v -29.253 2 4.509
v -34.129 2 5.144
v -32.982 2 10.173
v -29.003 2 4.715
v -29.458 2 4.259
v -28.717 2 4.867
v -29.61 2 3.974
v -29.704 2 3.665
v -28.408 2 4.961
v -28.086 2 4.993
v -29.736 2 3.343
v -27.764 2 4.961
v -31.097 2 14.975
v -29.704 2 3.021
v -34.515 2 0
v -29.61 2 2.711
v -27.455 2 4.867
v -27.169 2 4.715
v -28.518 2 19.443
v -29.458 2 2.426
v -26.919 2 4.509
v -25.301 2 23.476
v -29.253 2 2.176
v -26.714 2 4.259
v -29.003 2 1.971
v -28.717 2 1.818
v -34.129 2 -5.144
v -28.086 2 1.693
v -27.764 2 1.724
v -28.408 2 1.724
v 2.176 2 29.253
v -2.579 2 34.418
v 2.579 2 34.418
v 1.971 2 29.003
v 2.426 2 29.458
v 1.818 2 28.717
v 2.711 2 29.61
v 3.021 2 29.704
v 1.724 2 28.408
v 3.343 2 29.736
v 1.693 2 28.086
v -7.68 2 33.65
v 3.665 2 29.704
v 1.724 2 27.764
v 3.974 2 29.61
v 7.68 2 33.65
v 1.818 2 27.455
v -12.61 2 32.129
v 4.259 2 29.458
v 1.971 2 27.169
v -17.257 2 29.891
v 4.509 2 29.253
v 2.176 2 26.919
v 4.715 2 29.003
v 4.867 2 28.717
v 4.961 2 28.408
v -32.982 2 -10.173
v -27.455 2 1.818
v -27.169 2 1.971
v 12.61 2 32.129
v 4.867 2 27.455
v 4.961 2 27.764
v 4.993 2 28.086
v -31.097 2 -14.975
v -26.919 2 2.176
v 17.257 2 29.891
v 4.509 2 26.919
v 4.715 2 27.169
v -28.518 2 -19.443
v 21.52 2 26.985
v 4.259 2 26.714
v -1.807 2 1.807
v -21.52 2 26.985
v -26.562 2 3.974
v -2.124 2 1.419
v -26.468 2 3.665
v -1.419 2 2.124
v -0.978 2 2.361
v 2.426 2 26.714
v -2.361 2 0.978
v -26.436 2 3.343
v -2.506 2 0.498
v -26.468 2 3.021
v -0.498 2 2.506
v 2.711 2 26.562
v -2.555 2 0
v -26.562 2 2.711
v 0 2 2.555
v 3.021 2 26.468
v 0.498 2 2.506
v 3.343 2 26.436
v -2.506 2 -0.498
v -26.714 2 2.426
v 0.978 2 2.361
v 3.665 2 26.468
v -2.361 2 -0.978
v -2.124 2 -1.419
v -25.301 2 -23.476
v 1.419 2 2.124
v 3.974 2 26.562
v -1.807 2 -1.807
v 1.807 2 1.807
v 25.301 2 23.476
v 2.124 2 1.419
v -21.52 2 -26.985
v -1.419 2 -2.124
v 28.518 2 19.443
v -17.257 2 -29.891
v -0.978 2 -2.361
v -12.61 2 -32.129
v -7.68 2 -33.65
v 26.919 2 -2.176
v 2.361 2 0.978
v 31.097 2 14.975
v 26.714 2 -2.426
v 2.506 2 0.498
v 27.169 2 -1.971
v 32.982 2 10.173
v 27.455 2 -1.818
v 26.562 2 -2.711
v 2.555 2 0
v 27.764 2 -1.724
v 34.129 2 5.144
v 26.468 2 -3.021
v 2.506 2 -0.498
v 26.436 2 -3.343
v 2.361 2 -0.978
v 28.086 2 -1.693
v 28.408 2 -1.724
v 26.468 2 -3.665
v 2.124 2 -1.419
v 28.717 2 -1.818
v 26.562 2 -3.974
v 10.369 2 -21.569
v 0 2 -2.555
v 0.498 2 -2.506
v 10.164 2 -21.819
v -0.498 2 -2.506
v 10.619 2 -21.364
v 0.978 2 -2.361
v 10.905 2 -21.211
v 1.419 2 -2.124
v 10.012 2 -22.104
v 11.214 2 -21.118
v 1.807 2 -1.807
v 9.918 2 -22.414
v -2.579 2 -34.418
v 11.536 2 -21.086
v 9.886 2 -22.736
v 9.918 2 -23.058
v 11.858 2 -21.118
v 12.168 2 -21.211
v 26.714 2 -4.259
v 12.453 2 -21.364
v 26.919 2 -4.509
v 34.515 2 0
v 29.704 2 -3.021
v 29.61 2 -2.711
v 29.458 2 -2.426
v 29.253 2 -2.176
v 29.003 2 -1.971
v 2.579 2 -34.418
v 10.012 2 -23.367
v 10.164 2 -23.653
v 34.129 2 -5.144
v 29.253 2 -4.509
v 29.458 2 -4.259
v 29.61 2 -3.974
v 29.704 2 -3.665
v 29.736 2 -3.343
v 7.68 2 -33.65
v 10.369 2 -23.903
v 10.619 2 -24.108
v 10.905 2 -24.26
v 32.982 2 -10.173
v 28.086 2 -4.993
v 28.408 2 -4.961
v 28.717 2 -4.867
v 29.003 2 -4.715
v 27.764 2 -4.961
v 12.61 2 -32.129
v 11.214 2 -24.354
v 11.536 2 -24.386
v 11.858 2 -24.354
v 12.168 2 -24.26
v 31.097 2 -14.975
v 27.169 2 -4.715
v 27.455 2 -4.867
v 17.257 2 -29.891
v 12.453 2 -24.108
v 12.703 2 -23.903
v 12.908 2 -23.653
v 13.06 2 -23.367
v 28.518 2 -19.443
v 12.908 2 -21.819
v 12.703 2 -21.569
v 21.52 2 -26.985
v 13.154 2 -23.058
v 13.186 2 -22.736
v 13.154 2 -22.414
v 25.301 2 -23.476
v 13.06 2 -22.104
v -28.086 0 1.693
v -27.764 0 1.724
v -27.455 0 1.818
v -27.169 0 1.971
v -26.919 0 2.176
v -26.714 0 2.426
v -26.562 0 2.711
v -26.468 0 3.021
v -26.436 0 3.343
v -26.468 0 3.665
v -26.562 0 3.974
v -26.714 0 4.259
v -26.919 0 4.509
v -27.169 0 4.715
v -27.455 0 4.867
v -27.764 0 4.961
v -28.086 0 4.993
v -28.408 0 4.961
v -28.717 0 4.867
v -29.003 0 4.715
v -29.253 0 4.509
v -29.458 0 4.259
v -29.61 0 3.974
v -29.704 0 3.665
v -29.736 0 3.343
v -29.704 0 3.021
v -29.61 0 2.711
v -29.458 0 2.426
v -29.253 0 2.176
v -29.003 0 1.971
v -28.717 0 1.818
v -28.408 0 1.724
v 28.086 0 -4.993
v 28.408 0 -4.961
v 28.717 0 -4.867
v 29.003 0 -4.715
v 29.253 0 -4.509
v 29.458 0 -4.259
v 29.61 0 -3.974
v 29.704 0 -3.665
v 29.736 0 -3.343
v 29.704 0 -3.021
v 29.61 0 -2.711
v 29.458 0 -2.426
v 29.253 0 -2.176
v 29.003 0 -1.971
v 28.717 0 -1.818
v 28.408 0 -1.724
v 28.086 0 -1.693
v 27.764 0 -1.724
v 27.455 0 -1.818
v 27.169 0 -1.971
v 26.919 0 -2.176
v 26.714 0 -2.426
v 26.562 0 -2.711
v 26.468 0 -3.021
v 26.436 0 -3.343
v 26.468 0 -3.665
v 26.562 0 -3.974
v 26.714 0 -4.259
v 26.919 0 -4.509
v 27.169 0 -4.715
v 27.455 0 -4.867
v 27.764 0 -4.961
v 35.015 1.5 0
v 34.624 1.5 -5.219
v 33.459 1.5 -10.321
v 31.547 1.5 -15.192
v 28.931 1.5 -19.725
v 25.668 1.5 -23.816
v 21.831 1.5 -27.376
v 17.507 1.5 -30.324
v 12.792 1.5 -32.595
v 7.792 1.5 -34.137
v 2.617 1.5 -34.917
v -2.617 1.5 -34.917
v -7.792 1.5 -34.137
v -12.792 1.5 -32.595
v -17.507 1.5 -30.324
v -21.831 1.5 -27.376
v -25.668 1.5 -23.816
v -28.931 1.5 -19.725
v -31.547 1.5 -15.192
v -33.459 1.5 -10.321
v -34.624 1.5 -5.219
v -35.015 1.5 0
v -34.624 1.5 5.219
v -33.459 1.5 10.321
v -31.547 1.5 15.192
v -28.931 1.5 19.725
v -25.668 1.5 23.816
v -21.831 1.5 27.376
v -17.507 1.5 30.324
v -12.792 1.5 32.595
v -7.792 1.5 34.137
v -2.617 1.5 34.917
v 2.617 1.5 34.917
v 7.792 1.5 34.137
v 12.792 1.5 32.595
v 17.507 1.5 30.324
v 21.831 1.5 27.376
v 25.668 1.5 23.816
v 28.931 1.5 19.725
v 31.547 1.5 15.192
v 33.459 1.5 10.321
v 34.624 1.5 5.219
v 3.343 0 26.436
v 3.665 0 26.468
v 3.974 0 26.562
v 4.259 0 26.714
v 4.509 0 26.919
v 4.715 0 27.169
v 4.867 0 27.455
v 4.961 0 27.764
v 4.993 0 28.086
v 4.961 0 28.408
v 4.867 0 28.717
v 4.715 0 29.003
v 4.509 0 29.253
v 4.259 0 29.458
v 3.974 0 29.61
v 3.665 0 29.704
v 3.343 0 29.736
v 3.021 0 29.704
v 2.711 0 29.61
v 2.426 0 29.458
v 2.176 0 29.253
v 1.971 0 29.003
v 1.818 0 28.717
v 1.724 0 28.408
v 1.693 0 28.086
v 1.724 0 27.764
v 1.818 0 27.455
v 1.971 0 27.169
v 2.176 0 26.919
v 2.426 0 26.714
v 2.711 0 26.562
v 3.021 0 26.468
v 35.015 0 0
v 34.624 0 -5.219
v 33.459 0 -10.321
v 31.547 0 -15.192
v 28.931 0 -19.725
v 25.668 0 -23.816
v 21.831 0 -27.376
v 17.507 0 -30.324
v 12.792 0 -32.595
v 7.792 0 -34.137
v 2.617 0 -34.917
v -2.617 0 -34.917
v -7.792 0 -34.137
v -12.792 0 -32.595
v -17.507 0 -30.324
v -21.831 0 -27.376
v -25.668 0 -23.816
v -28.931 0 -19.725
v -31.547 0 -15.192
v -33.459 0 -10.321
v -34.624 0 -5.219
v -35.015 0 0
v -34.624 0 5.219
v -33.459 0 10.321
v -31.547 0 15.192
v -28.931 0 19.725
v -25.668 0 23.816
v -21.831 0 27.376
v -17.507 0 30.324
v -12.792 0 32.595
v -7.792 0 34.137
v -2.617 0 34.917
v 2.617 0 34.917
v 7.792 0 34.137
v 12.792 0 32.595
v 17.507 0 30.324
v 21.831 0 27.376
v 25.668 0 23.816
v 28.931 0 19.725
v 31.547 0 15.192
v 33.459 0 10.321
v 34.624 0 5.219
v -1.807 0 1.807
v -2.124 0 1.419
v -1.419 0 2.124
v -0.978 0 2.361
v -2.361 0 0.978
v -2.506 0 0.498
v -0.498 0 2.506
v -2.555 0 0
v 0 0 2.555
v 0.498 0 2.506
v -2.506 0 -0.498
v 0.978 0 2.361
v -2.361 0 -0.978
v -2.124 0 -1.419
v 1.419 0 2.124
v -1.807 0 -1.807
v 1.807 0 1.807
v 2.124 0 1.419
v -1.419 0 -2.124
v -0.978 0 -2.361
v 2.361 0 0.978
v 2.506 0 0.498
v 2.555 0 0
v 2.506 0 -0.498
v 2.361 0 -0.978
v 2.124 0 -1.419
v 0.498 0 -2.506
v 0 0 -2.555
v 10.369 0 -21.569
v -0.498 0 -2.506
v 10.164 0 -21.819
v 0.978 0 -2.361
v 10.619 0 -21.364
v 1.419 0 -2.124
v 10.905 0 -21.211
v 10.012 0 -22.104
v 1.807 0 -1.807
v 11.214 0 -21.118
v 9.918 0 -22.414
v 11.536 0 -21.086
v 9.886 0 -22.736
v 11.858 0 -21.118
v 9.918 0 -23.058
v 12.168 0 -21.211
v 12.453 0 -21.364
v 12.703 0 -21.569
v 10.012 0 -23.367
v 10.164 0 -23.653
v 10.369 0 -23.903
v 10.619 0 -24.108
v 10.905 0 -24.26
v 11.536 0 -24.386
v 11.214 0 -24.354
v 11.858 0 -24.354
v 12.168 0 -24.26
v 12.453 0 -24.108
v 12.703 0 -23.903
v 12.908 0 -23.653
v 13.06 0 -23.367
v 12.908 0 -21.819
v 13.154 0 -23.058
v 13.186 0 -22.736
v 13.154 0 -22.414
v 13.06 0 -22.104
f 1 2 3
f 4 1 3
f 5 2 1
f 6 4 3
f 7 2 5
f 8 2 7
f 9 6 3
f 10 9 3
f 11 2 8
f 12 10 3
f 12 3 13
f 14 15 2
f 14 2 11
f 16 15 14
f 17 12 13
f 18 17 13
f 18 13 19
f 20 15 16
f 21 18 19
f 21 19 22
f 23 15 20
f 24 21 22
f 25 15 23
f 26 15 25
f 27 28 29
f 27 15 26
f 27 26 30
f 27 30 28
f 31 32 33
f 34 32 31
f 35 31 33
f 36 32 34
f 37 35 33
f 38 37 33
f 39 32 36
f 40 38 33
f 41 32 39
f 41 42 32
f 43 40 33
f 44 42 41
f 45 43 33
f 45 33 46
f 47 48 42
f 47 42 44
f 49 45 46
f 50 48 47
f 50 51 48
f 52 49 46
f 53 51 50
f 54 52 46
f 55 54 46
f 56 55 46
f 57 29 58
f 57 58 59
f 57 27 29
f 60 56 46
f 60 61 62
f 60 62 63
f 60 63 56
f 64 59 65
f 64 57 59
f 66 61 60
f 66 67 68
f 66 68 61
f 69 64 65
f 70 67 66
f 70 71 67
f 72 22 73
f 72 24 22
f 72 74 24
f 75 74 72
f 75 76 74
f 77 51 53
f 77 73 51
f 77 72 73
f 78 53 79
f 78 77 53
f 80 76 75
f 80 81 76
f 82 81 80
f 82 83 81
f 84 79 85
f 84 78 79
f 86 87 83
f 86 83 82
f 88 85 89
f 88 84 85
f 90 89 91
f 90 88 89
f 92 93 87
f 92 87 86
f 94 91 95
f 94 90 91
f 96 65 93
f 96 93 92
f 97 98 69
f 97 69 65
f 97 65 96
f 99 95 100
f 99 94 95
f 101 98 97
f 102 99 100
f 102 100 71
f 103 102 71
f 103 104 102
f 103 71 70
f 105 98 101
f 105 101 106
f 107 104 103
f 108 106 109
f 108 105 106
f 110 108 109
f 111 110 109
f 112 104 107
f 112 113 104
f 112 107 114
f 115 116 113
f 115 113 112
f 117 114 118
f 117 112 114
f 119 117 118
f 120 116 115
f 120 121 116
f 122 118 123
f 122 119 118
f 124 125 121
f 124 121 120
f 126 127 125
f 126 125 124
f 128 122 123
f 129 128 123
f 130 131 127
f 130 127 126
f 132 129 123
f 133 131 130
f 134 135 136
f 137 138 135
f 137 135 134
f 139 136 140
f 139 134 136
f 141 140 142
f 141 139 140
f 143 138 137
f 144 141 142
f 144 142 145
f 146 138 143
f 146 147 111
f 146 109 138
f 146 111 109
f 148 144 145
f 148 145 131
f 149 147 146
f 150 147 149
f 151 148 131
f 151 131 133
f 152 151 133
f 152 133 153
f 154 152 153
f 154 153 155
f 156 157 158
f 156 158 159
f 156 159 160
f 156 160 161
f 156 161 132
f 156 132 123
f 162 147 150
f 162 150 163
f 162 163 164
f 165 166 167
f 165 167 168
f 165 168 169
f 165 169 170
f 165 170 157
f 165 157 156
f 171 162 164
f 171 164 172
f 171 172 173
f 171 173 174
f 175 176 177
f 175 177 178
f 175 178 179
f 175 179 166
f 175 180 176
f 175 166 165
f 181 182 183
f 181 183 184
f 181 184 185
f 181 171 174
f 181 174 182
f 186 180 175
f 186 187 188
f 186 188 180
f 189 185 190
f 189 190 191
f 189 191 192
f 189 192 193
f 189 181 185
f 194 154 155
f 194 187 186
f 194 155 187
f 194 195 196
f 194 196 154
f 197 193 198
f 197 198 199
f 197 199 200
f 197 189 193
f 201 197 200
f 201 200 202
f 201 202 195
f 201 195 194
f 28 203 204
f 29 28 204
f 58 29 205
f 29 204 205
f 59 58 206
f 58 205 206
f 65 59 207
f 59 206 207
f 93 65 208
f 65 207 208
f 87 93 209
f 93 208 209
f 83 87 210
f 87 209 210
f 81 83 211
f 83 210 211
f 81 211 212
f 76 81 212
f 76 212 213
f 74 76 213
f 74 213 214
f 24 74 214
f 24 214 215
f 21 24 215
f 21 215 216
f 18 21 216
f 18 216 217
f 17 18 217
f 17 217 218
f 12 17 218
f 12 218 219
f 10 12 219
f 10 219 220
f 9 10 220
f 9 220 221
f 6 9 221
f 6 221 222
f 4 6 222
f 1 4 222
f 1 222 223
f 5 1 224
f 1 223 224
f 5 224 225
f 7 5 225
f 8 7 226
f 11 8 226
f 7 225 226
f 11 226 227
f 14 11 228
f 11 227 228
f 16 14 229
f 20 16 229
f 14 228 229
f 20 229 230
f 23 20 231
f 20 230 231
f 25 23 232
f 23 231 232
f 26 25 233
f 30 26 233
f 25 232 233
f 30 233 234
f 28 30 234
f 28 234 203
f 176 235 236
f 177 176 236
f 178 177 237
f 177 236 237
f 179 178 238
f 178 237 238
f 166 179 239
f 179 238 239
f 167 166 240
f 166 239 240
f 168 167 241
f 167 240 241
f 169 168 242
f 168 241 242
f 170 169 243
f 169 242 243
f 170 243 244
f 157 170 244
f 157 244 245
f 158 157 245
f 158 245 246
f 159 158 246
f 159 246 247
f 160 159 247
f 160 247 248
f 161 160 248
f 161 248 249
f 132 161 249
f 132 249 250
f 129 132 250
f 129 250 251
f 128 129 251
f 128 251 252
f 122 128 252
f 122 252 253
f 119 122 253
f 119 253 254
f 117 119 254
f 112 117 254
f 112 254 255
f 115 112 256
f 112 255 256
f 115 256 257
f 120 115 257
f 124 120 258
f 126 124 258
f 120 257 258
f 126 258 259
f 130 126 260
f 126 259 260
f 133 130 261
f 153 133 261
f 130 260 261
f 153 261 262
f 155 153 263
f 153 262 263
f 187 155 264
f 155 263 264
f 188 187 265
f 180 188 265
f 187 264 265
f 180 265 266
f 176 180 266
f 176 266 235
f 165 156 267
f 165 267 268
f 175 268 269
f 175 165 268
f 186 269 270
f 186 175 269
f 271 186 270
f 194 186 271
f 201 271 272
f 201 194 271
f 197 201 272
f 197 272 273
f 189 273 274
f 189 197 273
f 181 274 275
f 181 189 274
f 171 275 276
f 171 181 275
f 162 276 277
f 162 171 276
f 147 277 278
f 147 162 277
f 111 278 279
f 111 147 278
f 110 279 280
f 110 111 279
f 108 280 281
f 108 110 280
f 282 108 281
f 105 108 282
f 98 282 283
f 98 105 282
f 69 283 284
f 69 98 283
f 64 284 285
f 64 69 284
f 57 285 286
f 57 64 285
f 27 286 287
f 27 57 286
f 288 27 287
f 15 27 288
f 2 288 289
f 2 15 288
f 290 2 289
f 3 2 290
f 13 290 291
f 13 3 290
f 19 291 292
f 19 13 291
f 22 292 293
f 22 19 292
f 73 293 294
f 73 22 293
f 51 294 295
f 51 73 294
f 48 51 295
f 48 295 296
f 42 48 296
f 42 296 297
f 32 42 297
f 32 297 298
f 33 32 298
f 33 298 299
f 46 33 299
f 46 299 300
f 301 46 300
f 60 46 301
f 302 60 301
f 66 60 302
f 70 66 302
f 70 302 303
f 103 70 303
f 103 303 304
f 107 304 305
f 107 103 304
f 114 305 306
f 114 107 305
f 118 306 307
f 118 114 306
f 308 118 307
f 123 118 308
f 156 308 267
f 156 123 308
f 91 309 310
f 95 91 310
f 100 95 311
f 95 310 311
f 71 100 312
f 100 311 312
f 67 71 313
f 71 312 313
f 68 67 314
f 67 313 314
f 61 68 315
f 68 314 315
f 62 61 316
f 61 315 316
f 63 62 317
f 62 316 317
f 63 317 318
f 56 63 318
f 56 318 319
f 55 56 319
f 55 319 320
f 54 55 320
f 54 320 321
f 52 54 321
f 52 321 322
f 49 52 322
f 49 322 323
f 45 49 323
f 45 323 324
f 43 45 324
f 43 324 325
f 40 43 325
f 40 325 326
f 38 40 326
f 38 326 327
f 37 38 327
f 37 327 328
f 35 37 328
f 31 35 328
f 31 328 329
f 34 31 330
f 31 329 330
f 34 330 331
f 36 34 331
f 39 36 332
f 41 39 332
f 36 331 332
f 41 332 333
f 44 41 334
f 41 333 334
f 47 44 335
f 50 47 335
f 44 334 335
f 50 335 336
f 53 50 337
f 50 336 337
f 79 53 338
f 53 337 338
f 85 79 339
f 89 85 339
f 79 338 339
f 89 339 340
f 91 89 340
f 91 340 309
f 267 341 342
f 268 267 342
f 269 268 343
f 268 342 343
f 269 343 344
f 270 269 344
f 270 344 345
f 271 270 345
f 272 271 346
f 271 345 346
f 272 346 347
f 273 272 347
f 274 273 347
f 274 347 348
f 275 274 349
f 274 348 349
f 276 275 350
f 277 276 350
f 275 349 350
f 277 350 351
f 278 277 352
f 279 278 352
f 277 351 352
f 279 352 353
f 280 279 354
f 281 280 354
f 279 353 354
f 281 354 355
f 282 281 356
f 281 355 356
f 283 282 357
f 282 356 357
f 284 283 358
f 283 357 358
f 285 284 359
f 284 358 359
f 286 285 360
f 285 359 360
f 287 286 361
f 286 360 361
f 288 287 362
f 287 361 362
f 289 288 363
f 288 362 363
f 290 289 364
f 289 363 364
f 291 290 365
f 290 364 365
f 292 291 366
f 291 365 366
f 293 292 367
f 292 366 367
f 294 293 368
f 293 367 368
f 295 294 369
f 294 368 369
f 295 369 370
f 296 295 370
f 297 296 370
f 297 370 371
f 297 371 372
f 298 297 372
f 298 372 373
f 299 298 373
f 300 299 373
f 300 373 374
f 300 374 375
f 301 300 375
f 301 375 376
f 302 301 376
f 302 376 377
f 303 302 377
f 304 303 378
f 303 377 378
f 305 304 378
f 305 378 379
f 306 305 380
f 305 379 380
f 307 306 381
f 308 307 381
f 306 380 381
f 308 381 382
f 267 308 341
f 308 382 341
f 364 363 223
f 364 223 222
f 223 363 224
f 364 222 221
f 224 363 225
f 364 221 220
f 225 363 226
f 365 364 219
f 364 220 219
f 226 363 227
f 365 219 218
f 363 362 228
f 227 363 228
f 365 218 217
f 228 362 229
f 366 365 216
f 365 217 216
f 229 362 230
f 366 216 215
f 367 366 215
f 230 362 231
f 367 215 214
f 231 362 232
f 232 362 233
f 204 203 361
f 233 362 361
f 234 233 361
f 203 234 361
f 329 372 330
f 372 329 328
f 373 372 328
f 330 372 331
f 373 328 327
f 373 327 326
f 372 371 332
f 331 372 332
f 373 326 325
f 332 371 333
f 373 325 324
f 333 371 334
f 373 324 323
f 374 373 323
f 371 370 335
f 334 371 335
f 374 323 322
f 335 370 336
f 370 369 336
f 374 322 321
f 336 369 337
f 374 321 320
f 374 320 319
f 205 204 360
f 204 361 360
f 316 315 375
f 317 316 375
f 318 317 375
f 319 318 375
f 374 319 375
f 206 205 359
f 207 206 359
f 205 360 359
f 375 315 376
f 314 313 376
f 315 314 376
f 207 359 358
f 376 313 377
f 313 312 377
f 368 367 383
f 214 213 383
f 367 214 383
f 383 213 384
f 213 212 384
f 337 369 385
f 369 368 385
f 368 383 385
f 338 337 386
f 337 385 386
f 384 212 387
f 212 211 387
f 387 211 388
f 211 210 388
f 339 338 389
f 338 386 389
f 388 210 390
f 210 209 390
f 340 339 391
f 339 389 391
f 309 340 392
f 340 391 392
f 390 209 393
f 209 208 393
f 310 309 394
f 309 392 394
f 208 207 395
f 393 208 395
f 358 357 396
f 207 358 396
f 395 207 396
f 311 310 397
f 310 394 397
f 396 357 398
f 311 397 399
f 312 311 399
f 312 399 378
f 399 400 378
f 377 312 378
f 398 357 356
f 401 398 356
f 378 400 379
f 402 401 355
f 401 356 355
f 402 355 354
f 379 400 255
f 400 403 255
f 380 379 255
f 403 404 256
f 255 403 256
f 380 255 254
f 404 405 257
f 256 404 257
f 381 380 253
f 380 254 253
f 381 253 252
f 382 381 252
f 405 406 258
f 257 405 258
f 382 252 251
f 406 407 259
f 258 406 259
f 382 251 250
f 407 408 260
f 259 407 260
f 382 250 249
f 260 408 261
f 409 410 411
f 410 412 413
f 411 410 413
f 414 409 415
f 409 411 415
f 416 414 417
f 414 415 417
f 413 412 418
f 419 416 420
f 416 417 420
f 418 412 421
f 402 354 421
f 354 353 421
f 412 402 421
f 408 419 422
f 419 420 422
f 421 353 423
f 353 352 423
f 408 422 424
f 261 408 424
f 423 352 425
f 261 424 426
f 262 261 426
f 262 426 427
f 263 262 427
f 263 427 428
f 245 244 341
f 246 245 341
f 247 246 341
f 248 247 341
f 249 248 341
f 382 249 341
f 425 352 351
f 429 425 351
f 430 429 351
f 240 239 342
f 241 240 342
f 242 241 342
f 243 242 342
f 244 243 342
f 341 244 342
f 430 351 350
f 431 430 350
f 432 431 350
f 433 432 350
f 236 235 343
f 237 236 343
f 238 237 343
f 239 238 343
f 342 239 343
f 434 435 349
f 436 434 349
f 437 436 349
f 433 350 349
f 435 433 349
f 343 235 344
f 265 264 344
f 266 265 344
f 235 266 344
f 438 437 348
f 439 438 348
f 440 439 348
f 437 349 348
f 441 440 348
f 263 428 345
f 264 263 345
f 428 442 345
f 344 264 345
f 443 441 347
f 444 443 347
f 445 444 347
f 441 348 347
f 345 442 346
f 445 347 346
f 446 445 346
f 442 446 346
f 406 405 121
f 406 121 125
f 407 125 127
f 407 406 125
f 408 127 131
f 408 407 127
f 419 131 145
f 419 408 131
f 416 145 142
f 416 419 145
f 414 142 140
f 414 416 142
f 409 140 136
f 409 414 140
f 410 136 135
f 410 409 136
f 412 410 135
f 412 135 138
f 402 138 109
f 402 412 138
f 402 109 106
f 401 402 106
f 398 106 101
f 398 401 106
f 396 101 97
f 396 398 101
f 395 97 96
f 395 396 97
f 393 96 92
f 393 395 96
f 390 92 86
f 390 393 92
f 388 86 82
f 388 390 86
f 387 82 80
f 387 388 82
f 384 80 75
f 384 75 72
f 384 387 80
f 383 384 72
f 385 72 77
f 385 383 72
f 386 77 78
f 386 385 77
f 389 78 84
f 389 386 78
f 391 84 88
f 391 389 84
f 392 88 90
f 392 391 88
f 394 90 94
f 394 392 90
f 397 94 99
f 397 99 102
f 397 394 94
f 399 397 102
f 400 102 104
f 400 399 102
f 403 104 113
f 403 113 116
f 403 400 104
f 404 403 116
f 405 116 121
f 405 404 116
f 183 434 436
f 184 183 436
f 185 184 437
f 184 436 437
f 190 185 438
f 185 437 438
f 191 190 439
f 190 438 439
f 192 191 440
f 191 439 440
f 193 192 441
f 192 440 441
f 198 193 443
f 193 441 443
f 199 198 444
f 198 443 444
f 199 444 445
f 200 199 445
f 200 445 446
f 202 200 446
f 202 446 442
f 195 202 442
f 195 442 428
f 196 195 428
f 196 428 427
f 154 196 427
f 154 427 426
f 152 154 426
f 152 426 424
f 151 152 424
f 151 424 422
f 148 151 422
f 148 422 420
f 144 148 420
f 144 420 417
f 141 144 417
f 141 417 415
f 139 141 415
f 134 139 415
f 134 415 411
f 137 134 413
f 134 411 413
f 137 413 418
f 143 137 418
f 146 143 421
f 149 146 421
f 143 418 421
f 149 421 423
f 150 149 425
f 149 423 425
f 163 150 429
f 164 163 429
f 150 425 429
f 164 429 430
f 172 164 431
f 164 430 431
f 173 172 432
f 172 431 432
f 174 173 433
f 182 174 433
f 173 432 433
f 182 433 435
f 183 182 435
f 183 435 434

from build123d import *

# Parameters (mm, degrees)
SKETCH1_R             = 35.015
SKETCH1_R_2           = 2.555
BOSS_EXTRUDE1_DEPTH   = 2
CHAMFER1_SIZE         = 0.5
M4X0_7_TAPPED_HOLE1_D = 3.3


with BuildPart() as part:
    # Sketch1 → Boss-Extrude1 (new body)
    with BuildSketch(Plane(origin=(0, 0, 0), x_dir=(1, 0, 0), z_dir=(0, 1, 0))):
        Circle(SKETCH1_R)
        Circle(SKETCH1_R_2, mode=Mode.SUBTRACT)
    extrude(amount=BOSS_EXTRUDE1_DEPTH)

    # Chamfer1
    chamfer1_edges = [part.edges().sort_by_distance(p)[0] for p in [
        (-35.015, 2, 0),
    ]]
    chamfer(chamfer1_edges, length=CHAMFER1_SIZE)

    # M4x0.7 Tapped Hole1 (through all)
    with Locations(Plane(origin=(3.342611255, 2, 28.08606327), x_dir=(0, 0, 1), z_dir=(0, 1, 0))):
        with Locations((0, 0), (-24.743452015, -31.428674525), (-50.82191635, 8.193461939), (-31.428674525, 24.743452015)):
            Hole(M4X0_7_TAPPED_HOLE1_D / 2)


solid = part.part
